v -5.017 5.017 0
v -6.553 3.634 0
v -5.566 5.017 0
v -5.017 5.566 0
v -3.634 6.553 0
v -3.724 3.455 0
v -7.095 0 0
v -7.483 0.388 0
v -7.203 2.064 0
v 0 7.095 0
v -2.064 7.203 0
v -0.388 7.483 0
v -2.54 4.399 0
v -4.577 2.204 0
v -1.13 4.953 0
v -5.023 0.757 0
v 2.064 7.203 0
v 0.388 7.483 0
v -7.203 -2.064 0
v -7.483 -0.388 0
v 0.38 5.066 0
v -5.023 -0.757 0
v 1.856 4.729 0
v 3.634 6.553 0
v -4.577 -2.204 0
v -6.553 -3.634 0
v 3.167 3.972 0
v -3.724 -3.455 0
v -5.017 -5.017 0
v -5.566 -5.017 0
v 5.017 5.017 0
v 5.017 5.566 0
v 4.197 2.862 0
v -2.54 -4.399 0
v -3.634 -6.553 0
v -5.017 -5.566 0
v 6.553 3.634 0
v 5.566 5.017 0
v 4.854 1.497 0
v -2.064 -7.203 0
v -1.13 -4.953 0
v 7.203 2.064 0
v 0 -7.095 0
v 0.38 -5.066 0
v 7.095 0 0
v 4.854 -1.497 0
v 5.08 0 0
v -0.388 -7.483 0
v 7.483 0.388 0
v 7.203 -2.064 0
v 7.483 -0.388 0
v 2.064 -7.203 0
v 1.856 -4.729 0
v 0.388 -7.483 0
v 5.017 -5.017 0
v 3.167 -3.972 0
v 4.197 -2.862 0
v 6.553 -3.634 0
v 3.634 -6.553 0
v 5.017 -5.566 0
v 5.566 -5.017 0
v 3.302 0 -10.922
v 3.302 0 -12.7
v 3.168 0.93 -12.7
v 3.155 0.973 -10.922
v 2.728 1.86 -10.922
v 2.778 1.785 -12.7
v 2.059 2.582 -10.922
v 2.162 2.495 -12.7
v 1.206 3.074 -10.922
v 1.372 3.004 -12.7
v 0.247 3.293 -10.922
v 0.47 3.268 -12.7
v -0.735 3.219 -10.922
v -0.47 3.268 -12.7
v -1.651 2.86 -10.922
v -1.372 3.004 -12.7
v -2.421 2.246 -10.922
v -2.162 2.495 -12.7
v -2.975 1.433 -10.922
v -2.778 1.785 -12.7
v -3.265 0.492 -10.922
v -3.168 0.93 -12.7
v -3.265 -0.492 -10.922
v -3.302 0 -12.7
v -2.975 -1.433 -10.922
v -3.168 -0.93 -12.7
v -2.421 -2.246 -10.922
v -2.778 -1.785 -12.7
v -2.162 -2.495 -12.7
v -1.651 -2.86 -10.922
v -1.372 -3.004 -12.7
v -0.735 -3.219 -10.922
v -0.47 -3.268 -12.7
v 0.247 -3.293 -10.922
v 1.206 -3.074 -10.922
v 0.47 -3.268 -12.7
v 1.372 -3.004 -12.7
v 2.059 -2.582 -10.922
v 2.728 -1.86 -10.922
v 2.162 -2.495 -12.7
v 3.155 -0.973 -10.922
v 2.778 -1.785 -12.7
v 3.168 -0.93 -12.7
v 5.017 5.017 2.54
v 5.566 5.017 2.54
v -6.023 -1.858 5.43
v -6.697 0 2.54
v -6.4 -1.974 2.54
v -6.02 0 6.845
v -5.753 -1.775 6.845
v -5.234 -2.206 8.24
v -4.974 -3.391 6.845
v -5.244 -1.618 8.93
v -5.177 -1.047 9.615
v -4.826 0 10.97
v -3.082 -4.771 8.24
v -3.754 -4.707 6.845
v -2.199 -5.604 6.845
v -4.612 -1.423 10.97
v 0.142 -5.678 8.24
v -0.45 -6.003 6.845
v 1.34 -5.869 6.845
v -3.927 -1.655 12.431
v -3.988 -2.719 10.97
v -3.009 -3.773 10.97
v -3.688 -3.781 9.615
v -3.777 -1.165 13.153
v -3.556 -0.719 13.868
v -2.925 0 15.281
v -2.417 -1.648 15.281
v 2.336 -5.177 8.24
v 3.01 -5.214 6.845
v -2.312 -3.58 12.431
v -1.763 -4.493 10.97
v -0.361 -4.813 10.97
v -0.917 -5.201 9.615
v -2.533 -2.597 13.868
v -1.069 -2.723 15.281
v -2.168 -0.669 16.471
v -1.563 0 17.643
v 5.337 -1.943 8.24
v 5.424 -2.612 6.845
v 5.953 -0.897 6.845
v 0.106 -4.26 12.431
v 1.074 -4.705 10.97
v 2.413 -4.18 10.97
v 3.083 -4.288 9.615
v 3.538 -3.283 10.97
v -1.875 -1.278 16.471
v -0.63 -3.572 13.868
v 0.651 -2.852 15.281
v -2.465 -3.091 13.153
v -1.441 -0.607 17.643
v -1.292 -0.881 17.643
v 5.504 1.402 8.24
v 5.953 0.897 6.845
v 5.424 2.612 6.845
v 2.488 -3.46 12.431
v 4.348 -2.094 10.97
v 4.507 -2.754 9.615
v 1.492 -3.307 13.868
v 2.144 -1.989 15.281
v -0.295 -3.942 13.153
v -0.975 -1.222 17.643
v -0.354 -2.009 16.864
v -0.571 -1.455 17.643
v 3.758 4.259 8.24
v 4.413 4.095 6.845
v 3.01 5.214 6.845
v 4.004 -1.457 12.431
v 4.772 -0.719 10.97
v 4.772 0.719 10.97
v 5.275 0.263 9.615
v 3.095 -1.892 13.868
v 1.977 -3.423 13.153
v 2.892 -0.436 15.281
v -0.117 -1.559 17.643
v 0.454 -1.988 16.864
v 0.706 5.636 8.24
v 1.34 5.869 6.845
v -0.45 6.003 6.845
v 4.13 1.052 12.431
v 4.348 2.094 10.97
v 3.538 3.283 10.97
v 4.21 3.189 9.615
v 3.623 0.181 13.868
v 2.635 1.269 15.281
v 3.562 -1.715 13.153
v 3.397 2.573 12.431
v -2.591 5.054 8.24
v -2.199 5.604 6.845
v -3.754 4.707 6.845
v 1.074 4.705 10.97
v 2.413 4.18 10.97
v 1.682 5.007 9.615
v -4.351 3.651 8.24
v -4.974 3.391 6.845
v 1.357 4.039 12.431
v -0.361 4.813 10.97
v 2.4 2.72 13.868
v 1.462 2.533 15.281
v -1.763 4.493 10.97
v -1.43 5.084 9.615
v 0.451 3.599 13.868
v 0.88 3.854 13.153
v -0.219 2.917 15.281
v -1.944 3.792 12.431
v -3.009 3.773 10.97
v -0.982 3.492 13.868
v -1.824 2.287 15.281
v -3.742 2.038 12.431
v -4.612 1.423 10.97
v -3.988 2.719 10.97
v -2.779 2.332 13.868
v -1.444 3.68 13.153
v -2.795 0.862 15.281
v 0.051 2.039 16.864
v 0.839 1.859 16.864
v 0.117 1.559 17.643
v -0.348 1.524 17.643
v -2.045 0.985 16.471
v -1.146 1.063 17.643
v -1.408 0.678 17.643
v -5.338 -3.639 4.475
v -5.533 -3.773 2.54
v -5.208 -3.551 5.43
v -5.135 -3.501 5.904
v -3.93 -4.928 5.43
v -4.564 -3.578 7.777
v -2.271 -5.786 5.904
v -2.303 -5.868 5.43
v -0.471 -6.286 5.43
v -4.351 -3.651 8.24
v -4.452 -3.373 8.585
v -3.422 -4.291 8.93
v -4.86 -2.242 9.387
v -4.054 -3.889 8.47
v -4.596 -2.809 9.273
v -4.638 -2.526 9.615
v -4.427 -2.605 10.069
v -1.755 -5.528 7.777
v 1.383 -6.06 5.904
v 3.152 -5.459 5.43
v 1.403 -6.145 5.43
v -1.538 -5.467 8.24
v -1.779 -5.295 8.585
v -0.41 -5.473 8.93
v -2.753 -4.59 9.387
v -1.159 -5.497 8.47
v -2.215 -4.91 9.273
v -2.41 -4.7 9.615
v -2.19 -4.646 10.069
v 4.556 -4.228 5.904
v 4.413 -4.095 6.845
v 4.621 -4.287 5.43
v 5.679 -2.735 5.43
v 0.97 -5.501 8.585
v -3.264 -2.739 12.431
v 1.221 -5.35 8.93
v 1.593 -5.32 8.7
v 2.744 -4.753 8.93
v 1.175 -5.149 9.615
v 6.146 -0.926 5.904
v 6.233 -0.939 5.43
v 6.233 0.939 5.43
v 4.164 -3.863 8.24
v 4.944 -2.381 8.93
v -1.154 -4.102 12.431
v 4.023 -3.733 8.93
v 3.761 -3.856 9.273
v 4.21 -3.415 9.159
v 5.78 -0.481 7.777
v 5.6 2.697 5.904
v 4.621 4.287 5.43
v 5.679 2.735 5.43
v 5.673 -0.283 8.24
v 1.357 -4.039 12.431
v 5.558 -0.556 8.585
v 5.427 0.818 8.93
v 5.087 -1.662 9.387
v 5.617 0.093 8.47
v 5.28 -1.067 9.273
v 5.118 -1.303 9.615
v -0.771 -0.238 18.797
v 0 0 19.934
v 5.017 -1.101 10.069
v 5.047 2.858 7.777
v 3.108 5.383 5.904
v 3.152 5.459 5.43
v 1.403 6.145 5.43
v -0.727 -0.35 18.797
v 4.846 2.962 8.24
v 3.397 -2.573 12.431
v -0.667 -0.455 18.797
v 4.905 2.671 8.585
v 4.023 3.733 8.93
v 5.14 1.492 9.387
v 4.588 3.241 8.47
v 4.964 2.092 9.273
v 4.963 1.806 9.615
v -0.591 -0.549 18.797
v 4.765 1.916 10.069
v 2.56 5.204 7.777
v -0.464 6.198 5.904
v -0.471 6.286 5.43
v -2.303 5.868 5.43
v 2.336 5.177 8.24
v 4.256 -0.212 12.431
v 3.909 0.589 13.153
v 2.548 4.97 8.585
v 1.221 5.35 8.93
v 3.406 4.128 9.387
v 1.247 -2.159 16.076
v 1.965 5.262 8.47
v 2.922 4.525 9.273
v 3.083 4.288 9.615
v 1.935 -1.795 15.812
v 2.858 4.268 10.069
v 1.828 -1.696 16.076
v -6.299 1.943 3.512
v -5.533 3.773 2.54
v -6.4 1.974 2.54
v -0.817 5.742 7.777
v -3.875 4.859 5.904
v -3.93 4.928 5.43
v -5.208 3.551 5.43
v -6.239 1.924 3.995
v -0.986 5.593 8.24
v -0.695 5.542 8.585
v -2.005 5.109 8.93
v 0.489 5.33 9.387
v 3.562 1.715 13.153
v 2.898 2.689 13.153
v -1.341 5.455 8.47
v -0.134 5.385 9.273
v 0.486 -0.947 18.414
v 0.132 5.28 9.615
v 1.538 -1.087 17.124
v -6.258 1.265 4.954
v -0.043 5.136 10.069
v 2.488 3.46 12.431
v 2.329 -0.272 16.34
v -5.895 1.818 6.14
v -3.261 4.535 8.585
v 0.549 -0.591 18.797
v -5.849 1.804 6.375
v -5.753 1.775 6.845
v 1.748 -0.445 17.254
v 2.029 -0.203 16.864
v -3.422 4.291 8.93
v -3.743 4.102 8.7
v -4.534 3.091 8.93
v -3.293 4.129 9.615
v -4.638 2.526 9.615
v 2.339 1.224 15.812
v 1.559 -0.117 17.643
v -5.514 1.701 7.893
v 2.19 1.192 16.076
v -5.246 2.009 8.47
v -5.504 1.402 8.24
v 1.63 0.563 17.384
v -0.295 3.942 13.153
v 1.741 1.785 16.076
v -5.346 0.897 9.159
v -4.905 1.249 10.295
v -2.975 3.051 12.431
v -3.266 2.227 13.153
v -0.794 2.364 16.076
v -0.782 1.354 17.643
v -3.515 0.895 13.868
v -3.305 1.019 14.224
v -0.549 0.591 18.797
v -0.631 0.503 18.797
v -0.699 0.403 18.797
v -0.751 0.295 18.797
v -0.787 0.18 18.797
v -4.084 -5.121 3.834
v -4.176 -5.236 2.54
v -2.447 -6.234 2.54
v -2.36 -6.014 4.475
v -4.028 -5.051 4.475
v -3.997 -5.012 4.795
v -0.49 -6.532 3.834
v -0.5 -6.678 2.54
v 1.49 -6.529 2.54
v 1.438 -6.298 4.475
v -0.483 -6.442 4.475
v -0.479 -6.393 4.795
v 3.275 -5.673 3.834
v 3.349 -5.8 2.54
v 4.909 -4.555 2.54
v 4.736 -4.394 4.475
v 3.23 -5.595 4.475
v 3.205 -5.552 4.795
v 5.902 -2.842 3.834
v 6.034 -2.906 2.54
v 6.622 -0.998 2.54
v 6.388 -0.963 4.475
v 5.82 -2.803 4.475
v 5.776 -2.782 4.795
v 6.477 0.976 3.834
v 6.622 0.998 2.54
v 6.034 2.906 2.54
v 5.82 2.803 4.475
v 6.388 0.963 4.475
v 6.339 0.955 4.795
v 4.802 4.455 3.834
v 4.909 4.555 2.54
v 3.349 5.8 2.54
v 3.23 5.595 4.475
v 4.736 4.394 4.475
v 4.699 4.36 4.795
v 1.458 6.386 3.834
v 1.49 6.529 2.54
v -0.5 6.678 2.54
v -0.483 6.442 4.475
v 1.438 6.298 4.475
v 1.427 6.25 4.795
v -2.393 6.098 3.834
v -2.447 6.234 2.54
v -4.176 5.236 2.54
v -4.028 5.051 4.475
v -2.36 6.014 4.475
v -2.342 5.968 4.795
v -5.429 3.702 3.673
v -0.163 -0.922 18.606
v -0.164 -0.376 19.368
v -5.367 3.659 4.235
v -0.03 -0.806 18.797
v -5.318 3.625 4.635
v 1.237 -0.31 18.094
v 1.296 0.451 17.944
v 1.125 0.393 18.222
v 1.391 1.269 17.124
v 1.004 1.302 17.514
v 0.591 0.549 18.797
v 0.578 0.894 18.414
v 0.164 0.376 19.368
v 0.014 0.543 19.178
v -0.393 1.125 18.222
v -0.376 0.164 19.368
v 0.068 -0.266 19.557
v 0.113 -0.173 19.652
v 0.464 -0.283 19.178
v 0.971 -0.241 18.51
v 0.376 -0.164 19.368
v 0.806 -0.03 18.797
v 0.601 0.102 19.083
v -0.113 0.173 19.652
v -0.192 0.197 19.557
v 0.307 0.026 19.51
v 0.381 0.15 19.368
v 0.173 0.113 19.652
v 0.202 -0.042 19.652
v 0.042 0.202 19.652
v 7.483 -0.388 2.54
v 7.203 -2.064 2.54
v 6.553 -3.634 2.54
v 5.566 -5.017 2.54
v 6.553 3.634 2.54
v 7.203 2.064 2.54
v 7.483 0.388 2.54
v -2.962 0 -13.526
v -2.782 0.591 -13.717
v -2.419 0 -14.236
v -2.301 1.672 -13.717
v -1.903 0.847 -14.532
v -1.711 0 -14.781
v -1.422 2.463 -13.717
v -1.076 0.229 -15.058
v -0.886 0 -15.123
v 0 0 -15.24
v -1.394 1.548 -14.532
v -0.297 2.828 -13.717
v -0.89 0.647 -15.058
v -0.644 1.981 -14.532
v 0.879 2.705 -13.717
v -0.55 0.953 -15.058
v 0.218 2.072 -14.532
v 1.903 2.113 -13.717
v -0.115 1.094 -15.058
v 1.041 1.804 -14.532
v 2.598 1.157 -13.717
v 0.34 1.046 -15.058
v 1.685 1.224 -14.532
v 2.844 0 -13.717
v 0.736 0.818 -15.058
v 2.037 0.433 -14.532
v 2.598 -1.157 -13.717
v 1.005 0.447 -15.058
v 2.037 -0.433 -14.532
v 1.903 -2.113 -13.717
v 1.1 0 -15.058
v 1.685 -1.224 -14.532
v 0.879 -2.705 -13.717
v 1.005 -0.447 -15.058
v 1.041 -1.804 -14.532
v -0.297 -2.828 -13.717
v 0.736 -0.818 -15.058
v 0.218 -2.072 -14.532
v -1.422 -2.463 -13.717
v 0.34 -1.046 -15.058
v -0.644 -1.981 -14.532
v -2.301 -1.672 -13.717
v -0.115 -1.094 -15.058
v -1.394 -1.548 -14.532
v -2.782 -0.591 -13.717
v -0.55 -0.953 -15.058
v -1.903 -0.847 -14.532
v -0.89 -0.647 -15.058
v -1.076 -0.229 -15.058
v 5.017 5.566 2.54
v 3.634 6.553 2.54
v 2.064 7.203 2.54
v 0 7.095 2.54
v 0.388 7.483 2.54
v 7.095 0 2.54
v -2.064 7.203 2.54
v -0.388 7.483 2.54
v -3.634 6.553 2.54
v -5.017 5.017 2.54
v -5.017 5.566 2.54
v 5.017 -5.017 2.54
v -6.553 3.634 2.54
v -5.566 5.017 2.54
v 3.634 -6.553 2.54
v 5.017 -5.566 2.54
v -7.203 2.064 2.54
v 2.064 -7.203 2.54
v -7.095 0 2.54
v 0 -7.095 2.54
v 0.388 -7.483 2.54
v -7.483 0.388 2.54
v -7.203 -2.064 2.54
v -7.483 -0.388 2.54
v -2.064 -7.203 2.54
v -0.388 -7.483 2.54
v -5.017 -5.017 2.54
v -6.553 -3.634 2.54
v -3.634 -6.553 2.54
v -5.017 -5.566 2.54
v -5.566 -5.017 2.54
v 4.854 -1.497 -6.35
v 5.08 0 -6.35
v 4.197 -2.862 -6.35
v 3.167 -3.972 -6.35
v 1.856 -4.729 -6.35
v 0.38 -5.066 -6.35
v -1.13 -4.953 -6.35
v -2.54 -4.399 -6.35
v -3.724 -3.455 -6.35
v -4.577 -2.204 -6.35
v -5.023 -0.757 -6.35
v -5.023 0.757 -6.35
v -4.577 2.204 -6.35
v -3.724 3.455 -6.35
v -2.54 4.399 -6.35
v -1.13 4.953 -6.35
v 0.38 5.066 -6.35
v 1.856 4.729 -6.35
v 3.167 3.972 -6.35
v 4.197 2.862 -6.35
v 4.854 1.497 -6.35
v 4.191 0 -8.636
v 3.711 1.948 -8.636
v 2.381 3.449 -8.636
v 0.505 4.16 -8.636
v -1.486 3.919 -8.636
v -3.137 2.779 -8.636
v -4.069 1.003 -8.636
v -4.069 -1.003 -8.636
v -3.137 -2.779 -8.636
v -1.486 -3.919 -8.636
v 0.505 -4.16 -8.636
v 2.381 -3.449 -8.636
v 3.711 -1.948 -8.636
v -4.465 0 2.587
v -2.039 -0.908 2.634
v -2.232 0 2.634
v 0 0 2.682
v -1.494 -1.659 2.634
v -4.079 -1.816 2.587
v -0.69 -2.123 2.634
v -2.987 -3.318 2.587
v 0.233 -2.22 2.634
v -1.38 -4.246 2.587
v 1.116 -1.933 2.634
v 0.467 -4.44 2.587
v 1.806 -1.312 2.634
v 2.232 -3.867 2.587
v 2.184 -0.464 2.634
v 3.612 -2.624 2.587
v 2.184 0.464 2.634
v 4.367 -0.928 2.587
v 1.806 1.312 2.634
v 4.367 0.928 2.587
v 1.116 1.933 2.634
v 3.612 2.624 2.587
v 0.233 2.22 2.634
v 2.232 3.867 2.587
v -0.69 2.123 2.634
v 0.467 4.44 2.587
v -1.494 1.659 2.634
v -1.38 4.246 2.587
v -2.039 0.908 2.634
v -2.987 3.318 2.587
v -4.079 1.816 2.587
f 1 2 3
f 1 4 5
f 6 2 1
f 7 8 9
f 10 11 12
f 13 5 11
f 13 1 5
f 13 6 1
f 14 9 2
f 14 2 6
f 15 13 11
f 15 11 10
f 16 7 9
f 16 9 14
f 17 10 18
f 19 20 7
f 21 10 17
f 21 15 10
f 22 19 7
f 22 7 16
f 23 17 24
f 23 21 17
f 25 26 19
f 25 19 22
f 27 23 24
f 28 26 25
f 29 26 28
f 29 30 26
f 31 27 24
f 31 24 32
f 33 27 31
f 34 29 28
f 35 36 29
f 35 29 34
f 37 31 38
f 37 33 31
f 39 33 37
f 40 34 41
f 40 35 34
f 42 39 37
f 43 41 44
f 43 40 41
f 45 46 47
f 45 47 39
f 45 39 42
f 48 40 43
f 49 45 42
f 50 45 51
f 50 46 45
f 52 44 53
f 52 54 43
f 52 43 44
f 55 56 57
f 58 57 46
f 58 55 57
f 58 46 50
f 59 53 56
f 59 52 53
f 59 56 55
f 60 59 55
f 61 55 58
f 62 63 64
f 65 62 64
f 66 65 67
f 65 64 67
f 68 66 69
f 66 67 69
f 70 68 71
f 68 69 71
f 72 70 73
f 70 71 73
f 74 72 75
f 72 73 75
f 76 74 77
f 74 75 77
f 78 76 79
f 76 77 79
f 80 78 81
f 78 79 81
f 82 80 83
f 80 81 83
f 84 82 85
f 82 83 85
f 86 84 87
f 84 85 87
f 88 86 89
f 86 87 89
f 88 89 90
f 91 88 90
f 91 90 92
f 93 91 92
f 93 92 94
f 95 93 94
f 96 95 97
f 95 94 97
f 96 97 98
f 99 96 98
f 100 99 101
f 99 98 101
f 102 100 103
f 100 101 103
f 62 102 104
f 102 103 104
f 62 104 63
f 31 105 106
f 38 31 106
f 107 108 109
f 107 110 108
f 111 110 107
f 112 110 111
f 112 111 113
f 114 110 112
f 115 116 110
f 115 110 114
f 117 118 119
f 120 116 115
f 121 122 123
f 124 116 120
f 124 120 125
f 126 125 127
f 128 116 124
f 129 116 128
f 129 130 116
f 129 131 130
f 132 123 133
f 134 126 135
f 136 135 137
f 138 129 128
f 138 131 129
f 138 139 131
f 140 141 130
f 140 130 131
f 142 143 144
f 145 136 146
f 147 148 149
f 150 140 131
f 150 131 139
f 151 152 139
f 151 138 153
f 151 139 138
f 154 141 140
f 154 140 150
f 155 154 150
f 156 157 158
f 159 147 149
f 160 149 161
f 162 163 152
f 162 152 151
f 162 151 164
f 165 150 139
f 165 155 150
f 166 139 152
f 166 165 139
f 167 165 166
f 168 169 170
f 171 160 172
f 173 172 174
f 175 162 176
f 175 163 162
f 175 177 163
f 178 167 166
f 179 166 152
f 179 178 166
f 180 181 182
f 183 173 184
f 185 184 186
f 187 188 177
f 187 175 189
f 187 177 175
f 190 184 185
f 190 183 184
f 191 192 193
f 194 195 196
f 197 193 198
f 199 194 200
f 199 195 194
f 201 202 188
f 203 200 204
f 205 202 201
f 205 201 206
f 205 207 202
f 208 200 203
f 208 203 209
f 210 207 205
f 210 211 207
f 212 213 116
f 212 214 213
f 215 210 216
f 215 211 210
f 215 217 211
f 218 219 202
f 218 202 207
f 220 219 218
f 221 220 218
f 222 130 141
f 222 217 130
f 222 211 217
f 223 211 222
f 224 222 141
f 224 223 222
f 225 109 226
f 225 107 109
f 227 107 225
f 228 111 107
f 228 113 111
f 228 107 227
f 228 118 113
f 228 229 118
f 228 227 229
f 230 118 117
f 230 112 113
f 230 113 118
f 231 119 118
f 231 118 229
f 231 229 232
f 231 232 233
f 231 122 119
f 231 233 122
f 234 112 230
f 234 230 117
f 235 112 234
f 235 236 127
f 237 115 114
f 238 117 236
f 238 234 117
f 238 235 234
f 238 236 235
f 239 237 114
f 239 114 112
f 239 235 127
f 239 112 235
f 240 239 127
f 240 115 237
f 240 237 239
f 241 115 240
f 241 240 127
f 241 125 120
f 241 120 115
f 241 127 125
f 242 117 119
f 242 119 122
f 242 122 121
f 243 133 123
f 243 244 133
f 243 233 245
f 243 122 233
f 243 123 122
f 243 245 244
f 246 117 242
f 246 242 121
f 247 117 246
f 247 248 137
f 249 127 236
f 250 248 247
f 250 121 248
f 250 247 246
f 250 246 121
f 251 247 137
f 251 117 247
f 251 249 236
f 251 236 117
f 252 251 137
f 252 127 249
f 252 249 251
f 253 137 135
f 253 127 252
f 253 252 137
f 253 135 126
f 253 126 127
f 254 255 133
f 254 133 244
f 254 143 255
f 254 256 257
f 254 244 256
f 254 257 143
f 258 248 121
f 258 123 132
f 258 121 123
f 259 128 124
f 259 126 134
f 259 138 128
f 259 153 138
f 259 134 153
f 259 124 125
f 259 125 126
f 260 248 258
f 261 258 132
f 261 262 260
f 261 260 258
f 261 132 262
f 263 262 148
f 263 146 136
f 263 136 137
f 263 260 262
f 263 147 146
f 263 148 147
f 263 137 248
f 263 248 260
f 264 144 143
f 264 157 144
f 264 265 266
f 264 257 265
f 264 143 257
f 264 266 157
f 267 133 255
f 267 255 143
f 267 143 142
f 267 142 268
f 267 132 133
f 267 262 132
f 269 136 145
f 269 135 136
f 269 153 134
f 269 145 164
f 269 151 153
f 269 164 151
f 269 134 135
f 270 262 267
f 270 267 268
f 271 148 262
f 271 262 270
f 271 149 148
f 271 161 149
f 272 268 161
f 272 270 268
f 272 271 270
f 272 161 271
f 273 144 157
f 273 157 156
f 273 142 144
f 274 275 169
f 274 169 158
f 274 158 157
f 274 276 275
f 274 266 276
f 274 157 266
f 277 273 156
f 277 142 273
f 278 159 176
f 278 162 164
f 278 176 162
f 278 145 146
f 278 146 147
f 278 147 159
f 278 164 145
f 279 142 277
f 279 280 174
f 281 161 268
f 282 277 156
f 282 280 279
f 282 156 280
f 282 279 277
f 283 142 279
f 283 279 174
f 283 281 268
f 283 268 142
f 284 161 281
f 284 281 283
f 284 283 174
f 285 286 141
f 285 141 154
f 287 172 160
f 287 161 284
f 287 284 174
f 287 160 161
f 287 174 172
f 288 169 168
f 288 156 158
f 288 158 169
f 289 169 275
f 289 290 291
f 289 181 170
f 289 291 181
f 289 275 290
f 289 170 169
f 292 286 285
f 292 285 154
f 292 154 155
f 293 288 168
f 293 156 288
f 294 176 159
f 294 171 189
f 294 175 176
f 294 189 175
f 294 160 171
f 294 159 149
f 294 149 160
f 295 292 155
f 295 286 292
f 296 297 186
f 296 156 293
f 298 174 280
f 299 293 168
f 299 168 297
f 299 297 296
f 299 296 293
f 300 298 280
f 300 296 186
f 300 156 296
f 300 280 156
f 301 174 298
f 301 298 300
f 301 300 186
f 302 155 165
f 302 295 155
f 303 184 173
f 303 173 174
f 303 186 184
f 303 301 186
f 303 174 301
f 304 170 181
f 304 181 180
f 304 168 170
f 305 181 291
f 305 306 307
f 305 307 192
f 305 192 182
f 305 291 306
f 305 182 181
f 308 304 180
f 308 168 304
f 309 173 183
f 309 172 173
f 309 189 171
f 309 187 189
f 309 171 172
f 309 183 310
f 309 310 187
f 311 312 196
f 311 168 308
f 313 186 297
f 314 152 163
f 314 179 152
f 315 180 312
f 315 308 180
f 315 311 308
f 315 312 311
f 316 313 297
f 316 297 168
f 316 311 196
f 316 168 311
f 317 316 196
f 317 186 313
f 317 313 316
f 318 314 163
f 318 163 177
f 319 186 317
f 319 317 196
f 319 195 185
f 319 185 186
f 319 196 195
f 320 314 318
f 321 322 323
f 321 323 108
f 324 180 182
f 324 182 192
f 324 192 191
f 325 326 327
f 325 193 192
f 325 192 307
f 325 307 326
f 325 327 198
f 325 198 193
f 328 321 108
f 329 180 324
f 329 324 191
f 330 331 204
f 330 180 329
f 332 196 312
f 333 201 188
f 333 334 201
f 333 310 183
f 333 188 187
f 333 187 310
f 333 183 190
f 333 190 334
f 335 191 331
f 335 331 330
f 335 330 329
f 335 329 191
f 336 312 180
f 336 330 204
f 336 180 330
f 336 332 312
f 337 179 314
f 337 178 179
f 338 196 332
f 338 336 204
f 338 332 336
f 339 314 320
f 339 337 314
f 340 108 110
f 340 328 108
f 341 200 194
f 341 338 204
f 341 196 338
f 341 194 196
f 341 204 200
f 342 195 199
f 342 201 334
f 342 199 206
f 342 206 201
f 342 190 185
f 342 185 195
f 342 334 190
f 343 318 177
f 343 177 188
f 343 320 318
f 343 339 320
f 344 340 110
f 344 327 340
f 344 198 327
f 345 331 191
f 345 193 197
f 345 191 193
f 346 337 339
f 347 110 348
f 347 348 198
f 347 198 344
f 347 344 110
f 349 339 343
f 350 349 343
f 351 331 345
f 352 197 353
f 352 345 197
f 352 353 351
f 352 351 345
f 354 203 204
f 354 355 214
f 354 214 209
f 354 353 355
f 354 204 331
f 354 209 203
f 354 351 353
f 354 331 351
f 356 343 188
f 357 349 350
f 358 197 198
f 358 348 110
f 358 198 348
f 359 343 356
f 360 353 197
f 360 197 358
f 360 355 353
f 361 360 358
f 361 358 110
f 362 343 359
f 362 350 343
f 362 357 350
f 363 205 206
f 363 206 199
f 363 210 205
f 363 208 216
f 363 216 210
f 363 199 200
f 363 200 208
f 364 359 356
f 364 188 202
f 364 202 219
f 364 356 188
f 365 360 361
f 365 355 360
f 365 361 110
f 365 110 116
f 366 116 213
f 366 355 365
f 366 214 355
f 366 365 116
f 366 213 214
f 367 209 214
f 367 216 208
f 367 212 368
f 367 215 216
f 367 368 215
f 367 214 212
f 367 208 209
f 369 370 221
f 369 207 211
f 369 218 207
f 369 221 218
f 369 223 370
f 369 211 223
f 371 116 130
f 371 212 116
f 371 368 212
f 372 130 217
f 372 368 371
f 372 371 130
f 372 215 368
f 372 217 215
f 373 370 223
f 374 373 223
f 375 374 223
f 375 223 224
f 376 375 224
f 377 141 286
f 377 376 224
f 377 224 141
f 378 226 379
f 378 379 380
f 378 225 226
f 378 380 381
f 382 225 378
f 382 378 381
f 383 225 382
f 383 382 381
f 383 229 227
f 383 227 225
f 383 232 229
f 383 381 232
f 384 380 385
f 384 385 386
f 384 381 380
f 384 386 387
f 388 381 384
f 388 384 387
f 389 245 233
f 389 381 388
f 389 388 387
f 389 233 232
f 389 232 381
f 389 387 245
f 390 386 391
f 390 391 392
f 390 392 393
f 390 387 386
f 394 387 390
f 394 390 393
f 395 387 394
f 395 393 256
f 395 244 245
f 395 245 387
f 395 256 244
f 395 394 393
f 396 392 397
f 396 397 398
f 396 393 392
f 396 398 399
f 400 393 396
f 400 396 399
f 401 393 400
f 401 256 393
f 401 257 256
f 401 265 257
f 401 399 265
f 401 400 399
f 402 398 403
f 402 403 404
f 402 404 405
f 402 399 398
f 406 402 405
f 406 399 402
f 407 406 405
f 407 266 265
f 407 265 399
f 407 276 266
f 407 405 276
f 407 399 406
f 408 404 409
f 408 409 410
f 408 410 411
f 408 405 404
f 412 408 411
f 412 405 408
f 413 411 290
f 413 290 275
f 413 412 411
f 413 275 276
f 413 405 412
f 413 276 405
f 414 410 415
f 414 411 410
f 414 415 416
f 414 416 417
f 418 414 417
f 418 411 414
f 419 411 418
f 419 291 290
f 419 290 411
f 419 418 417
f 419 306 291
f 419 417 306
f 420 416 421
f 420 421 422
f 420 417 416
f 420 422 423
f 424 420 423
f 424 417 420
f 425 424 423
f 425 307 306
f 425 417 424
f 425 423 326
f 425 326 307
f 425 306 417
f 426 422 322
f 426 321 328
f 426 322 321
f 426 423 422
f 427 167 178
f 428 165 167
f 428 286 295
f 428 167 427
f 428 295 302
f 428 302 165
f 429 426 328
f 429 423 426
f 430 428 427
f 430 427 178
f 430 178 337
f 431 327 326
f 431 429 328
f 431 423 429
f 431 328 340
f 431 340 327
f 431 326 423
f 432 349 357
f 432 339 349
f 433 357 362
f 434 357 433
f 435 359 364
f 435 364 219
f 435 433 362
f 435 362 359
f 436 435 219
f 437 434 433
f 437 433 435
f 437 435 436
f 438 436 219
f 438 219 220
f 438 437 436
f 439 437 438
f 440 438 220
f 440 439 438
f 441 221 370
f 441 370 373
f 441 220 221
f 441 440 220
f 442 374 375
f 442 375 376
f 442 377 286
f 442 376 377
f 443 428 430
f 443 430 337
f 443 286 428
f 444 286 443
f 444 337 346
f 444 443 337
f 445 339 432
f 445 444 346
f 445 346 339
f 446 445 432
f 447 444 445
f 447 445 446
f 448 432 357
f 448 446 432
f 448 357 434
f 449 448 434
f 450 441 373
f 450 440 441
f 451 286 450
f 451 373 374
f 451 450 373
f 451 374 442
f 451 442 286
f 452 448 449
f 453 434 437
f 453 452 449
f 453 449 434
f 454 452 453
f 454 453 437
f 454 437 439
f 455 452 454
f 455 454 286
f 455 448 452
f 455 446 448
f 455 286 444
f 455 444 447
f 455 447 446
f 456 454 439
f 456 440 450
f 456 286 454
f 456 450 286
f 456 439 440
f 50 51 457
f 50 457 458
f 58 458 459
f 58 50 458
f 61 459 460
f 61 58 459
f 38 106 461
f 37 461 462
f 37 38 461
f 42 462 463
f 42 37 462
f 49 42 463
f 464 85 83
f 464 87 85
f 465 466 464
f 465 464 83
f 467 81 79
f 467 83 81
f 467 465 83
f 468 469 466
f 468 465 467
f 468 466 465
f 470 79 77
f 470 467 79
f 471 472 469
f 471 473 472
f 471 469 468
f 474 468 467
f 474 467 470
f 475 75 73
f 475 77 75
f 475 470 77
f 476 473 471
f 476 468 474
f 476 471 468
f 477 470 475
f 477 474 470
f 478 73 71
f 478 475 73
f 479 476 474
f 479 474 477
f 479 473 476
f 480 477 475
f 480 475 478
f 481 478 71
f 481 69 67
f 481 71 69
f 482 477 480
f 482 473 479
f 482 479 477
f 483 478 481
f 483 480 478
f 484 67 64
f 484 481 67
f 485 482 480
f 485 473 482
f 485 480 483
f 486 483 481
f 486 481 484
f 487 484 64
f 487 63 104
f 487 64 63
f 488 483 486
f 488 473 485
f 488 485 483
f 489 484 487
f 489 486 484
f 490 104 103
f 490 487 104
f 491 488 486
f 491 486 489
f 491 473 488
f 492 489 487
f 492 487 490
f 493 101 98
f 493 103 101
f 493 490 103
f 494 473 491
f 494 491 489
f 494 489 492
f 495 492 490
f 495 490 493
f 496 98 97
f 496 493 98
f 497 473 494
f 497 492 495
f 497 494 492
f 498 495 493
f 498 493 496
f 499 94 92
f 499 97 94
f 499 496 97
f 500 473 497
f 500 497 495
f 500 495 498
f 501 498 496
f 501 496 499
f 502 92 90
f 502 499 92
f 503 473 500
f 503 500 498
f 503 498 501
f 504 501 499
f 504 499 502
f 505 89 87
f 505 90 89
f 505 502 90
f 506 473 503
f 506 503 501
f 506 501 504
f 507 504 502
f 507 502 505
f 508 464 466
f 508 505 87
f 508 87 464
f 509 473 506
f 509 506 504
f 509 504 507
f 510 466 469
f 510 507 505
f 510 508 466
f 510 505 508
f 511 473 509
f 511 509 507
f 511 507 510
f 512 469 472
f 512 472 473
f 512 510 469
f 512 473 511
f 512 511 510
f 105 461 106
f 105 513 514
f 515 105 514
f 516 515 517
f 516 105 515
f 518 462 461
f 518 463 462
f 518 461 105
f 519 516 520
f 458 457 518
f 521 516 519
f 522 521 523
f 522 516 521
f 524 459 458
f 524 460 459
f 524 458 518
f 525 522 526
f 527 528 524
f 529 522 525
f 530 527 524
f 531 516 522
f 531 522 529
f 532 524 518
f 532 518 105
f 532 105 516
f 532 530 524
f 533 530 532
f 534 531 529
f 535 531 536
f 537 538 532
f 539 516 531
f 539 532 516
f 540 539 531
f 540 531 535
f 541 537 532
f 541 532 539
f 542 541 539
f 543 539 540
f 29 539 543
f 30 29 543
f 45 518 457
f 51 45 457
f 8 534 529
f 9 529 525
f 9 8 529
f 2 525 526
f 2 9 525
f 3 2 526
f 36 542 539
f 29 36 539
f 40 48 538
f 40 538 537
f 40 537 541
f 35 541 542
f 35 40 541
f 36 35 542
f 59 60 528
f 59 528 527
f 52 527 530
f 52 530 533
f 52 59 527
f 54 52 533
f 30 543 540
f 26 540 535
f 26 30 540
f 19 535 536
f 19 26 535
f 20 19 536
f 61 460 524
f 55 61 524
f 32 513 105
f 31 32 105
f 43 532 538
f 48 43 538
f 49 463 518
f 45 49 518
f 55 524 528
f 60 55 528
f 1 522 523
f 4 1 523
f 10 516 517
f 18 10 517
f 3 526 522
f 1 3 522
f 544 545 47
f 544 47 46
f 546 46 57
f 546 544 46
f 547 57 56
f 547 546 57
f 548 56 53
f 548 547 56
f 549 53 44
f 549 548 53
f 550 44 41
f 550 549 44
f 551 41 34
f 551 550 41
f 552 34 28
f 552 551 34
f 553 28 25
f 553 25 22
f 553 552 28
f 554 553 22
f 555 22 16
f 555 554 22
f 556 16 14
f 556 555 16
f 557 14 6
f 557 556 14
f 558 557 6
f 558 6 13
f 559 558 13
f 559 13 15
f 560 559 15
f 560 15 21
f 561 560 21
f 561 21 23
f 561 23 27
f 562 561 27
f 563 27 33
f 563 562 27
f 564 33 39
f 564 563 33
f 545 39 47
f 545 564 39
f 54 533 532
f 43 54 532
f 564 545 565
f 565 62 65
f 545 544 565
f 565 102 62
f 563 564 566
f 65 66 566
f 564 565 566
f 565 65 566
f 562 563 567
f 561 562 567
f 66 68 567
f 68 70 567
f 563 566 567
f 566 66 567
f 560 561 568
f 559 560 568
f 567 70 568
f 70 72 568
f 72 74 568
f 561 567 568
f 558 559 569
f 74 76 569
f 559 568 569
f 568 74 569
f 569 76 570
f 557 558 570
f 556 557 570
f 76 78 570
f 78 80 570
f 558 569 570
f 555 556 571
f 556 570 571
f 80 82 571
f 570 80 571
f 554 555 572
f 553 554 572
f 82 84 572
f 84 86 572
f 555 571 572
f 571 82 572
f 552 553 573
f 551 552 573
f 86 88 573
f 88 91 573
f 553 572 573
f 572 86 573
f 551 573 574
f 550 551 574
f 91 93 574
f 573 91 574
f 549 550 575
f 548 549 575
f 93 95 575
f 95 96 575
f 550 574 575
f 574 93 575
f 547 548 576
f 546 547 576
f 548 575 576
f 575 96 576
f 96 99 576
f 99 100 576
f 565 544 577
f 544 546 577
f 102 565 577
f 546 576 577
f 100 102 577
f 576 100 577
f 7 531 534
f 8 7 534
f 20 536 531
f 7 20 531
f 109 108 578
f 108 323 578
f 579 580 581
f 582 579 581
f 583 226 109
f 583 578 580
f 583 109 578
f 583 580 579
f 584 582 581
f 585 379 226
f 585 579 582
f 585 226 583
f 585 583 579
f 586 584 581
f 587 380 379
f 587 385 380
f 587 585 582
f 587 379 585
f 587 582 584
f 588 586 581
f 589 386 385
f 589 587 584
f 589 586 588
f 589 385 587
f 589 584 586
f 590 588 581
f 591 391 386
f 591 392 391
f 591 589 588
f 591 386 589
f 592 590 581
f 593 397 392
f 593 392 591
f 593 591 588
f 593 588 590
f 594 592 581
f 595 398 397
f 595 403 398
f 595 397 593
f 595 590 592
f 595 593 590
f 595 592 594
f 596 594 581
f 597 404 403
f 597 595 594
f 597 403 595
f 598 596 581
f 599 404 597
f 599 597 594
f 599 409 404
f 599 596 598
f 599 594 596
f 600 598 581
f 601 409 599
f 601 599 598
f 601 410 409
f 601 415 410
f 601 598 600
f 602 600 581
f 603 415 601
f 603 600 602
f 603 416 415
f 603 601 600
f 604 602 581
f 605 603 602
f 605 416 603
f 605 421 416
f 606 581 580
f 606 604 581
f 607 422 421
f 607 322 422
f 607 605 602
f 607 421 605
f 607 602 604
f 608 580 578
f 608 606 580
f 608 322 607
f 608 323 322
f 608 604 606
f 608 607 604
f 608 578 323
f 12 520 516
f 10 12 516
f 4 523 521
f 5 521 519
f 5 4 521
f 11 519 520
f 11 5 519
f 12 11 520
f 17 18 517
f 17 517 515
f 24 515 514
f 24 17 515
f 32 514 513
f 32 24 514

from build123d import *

# Parameters (mm, degrees)
DOME1_FACE_RADIUS = 3.302
DOME1_HEIGHT      = 2.54
SEEDCUT_DEPTH     = 21.698272826
CIRPATTERN1_COUNT = 8


# Read off the part's stored shape, not the designer's step: Cut-Revolve-Thin1
with BuildPart() as part:
    # Sketch1 → Revolve1 (revolve)
    with BuildSketch(Plane(origin=(0, 0, 0), x_dir=(0, 0, -1), z_dir=(1, 0, 0)), mode=Mode.PRIVATE) as revolve1_sk:
        Polygon((-2.54, 0), (-2.54, 7.493), (0, 7.493), (0, 5.08), (12.7, 5.08), (12.7, 0), align=None)
    revolve(revolve1_sk.sketch.rotate(Axis((0, 0, 11.886023166), (0, 0, -1)), 90), axis=Axis((0, 0, 11.886023166), (0, 0, -1)))

    # Cut-Revolve-Thin1 outline → Cut-Revolve-Thin1 (revolve, cut)
    with BuildSketch(Plane.XZ):
        Polygon((3.302, -10.922), (3.302, -12.7), (5.08, -12.7), (5.08, -6.35), align=None)
    revolve(axis=Axis((0, 0, 0), (0, 0, 1)), mode=Mode.SUBTRACT)

    # Dome1: a dome of height H over a round flat face of radius A is a cap of a sphere of radius (A * A + H * H) / (2 * H)
    dome1_r = (DOME1_FACE_RADIUS * DOME1_FACE_RADIUS + DOME1_HEIGHT * DOME1_HEIGHT) / (2 * DOME1_HEIGHT)
    dome1_base = Plane((0, 0, -12.7), z_dir=(0, 0, -1))
    with Locations(dome1_base.offset(DOME1_HEIGHT - dome1_r)):
        dome1_ball = Sphere(dome1_r, mode=Mode.PRIVATE)
    add(split(dome1_ball, bisect_by=dome1_base, keep=Keep.TOP, mode=Mode.PRIVATE))

    # Sketch4 → SeedCut (cut, through all)
    with BuildSketch(Plane.XY.offset(2.54)):
        with BuildLine():
            Line((0, 7.095048069), (0.387904496, 7.482952566))
            ThreePointArc((0.387904496, 7.482952566), (0, 7.493), (-0.387904496, 7.482952566))
            Line((-0.387904496, 7.482952566), (0, 7.095048069))
        make_face()
    seedcut = extrude(amount=-SEEDCUT_DEPTH, mode=Mode.SUBTRACT)

    # CirPattern1: SeedCut ×8 about axis
    cirpattern1_axis = Axis((0, 0, 0), (0, 0, 1))
    for i in range(1, CIRPATTERN1_COUNT):
        add(seedcut.rotate(cirpattern1_axis, i * 360 / CIRPATTERN1_COUNT), mode=Mode.SUBTRACT)


with BuildPart() as body_2:
    # Sketch2 → Revolve2 (revolve)
    with BuildSketch(Plane(origin=(0, 0, 0), x_dir=(0, 0, -1), z_dir=(1, 0, 0)), mode=Mode.PRIVATE) as revolve2_sk:
        with BuildLine():
            Line((-19.934319353, 0), (-2.68153526, 0))
            Line((-2.68153526, 0), (-2.54, 6.697096139))
            add(Edge.make_bspline(
                [(-2.54, 6.697096139), (-12.084947129, 5.788927202), (-19.934319353, 0)],
                knots=[0, 0, 0, 1, 1, 1], degree=2))
        make_face()
    revolve(revolve2_sk.sketch.rotate(Axis((0, 0, 11.886023166), (0, 0, 1)), 90), axis=Axis((0, 0, 11.886023166), (0, 0, 1)))


solid = Compound([part.part, body_2.part])
